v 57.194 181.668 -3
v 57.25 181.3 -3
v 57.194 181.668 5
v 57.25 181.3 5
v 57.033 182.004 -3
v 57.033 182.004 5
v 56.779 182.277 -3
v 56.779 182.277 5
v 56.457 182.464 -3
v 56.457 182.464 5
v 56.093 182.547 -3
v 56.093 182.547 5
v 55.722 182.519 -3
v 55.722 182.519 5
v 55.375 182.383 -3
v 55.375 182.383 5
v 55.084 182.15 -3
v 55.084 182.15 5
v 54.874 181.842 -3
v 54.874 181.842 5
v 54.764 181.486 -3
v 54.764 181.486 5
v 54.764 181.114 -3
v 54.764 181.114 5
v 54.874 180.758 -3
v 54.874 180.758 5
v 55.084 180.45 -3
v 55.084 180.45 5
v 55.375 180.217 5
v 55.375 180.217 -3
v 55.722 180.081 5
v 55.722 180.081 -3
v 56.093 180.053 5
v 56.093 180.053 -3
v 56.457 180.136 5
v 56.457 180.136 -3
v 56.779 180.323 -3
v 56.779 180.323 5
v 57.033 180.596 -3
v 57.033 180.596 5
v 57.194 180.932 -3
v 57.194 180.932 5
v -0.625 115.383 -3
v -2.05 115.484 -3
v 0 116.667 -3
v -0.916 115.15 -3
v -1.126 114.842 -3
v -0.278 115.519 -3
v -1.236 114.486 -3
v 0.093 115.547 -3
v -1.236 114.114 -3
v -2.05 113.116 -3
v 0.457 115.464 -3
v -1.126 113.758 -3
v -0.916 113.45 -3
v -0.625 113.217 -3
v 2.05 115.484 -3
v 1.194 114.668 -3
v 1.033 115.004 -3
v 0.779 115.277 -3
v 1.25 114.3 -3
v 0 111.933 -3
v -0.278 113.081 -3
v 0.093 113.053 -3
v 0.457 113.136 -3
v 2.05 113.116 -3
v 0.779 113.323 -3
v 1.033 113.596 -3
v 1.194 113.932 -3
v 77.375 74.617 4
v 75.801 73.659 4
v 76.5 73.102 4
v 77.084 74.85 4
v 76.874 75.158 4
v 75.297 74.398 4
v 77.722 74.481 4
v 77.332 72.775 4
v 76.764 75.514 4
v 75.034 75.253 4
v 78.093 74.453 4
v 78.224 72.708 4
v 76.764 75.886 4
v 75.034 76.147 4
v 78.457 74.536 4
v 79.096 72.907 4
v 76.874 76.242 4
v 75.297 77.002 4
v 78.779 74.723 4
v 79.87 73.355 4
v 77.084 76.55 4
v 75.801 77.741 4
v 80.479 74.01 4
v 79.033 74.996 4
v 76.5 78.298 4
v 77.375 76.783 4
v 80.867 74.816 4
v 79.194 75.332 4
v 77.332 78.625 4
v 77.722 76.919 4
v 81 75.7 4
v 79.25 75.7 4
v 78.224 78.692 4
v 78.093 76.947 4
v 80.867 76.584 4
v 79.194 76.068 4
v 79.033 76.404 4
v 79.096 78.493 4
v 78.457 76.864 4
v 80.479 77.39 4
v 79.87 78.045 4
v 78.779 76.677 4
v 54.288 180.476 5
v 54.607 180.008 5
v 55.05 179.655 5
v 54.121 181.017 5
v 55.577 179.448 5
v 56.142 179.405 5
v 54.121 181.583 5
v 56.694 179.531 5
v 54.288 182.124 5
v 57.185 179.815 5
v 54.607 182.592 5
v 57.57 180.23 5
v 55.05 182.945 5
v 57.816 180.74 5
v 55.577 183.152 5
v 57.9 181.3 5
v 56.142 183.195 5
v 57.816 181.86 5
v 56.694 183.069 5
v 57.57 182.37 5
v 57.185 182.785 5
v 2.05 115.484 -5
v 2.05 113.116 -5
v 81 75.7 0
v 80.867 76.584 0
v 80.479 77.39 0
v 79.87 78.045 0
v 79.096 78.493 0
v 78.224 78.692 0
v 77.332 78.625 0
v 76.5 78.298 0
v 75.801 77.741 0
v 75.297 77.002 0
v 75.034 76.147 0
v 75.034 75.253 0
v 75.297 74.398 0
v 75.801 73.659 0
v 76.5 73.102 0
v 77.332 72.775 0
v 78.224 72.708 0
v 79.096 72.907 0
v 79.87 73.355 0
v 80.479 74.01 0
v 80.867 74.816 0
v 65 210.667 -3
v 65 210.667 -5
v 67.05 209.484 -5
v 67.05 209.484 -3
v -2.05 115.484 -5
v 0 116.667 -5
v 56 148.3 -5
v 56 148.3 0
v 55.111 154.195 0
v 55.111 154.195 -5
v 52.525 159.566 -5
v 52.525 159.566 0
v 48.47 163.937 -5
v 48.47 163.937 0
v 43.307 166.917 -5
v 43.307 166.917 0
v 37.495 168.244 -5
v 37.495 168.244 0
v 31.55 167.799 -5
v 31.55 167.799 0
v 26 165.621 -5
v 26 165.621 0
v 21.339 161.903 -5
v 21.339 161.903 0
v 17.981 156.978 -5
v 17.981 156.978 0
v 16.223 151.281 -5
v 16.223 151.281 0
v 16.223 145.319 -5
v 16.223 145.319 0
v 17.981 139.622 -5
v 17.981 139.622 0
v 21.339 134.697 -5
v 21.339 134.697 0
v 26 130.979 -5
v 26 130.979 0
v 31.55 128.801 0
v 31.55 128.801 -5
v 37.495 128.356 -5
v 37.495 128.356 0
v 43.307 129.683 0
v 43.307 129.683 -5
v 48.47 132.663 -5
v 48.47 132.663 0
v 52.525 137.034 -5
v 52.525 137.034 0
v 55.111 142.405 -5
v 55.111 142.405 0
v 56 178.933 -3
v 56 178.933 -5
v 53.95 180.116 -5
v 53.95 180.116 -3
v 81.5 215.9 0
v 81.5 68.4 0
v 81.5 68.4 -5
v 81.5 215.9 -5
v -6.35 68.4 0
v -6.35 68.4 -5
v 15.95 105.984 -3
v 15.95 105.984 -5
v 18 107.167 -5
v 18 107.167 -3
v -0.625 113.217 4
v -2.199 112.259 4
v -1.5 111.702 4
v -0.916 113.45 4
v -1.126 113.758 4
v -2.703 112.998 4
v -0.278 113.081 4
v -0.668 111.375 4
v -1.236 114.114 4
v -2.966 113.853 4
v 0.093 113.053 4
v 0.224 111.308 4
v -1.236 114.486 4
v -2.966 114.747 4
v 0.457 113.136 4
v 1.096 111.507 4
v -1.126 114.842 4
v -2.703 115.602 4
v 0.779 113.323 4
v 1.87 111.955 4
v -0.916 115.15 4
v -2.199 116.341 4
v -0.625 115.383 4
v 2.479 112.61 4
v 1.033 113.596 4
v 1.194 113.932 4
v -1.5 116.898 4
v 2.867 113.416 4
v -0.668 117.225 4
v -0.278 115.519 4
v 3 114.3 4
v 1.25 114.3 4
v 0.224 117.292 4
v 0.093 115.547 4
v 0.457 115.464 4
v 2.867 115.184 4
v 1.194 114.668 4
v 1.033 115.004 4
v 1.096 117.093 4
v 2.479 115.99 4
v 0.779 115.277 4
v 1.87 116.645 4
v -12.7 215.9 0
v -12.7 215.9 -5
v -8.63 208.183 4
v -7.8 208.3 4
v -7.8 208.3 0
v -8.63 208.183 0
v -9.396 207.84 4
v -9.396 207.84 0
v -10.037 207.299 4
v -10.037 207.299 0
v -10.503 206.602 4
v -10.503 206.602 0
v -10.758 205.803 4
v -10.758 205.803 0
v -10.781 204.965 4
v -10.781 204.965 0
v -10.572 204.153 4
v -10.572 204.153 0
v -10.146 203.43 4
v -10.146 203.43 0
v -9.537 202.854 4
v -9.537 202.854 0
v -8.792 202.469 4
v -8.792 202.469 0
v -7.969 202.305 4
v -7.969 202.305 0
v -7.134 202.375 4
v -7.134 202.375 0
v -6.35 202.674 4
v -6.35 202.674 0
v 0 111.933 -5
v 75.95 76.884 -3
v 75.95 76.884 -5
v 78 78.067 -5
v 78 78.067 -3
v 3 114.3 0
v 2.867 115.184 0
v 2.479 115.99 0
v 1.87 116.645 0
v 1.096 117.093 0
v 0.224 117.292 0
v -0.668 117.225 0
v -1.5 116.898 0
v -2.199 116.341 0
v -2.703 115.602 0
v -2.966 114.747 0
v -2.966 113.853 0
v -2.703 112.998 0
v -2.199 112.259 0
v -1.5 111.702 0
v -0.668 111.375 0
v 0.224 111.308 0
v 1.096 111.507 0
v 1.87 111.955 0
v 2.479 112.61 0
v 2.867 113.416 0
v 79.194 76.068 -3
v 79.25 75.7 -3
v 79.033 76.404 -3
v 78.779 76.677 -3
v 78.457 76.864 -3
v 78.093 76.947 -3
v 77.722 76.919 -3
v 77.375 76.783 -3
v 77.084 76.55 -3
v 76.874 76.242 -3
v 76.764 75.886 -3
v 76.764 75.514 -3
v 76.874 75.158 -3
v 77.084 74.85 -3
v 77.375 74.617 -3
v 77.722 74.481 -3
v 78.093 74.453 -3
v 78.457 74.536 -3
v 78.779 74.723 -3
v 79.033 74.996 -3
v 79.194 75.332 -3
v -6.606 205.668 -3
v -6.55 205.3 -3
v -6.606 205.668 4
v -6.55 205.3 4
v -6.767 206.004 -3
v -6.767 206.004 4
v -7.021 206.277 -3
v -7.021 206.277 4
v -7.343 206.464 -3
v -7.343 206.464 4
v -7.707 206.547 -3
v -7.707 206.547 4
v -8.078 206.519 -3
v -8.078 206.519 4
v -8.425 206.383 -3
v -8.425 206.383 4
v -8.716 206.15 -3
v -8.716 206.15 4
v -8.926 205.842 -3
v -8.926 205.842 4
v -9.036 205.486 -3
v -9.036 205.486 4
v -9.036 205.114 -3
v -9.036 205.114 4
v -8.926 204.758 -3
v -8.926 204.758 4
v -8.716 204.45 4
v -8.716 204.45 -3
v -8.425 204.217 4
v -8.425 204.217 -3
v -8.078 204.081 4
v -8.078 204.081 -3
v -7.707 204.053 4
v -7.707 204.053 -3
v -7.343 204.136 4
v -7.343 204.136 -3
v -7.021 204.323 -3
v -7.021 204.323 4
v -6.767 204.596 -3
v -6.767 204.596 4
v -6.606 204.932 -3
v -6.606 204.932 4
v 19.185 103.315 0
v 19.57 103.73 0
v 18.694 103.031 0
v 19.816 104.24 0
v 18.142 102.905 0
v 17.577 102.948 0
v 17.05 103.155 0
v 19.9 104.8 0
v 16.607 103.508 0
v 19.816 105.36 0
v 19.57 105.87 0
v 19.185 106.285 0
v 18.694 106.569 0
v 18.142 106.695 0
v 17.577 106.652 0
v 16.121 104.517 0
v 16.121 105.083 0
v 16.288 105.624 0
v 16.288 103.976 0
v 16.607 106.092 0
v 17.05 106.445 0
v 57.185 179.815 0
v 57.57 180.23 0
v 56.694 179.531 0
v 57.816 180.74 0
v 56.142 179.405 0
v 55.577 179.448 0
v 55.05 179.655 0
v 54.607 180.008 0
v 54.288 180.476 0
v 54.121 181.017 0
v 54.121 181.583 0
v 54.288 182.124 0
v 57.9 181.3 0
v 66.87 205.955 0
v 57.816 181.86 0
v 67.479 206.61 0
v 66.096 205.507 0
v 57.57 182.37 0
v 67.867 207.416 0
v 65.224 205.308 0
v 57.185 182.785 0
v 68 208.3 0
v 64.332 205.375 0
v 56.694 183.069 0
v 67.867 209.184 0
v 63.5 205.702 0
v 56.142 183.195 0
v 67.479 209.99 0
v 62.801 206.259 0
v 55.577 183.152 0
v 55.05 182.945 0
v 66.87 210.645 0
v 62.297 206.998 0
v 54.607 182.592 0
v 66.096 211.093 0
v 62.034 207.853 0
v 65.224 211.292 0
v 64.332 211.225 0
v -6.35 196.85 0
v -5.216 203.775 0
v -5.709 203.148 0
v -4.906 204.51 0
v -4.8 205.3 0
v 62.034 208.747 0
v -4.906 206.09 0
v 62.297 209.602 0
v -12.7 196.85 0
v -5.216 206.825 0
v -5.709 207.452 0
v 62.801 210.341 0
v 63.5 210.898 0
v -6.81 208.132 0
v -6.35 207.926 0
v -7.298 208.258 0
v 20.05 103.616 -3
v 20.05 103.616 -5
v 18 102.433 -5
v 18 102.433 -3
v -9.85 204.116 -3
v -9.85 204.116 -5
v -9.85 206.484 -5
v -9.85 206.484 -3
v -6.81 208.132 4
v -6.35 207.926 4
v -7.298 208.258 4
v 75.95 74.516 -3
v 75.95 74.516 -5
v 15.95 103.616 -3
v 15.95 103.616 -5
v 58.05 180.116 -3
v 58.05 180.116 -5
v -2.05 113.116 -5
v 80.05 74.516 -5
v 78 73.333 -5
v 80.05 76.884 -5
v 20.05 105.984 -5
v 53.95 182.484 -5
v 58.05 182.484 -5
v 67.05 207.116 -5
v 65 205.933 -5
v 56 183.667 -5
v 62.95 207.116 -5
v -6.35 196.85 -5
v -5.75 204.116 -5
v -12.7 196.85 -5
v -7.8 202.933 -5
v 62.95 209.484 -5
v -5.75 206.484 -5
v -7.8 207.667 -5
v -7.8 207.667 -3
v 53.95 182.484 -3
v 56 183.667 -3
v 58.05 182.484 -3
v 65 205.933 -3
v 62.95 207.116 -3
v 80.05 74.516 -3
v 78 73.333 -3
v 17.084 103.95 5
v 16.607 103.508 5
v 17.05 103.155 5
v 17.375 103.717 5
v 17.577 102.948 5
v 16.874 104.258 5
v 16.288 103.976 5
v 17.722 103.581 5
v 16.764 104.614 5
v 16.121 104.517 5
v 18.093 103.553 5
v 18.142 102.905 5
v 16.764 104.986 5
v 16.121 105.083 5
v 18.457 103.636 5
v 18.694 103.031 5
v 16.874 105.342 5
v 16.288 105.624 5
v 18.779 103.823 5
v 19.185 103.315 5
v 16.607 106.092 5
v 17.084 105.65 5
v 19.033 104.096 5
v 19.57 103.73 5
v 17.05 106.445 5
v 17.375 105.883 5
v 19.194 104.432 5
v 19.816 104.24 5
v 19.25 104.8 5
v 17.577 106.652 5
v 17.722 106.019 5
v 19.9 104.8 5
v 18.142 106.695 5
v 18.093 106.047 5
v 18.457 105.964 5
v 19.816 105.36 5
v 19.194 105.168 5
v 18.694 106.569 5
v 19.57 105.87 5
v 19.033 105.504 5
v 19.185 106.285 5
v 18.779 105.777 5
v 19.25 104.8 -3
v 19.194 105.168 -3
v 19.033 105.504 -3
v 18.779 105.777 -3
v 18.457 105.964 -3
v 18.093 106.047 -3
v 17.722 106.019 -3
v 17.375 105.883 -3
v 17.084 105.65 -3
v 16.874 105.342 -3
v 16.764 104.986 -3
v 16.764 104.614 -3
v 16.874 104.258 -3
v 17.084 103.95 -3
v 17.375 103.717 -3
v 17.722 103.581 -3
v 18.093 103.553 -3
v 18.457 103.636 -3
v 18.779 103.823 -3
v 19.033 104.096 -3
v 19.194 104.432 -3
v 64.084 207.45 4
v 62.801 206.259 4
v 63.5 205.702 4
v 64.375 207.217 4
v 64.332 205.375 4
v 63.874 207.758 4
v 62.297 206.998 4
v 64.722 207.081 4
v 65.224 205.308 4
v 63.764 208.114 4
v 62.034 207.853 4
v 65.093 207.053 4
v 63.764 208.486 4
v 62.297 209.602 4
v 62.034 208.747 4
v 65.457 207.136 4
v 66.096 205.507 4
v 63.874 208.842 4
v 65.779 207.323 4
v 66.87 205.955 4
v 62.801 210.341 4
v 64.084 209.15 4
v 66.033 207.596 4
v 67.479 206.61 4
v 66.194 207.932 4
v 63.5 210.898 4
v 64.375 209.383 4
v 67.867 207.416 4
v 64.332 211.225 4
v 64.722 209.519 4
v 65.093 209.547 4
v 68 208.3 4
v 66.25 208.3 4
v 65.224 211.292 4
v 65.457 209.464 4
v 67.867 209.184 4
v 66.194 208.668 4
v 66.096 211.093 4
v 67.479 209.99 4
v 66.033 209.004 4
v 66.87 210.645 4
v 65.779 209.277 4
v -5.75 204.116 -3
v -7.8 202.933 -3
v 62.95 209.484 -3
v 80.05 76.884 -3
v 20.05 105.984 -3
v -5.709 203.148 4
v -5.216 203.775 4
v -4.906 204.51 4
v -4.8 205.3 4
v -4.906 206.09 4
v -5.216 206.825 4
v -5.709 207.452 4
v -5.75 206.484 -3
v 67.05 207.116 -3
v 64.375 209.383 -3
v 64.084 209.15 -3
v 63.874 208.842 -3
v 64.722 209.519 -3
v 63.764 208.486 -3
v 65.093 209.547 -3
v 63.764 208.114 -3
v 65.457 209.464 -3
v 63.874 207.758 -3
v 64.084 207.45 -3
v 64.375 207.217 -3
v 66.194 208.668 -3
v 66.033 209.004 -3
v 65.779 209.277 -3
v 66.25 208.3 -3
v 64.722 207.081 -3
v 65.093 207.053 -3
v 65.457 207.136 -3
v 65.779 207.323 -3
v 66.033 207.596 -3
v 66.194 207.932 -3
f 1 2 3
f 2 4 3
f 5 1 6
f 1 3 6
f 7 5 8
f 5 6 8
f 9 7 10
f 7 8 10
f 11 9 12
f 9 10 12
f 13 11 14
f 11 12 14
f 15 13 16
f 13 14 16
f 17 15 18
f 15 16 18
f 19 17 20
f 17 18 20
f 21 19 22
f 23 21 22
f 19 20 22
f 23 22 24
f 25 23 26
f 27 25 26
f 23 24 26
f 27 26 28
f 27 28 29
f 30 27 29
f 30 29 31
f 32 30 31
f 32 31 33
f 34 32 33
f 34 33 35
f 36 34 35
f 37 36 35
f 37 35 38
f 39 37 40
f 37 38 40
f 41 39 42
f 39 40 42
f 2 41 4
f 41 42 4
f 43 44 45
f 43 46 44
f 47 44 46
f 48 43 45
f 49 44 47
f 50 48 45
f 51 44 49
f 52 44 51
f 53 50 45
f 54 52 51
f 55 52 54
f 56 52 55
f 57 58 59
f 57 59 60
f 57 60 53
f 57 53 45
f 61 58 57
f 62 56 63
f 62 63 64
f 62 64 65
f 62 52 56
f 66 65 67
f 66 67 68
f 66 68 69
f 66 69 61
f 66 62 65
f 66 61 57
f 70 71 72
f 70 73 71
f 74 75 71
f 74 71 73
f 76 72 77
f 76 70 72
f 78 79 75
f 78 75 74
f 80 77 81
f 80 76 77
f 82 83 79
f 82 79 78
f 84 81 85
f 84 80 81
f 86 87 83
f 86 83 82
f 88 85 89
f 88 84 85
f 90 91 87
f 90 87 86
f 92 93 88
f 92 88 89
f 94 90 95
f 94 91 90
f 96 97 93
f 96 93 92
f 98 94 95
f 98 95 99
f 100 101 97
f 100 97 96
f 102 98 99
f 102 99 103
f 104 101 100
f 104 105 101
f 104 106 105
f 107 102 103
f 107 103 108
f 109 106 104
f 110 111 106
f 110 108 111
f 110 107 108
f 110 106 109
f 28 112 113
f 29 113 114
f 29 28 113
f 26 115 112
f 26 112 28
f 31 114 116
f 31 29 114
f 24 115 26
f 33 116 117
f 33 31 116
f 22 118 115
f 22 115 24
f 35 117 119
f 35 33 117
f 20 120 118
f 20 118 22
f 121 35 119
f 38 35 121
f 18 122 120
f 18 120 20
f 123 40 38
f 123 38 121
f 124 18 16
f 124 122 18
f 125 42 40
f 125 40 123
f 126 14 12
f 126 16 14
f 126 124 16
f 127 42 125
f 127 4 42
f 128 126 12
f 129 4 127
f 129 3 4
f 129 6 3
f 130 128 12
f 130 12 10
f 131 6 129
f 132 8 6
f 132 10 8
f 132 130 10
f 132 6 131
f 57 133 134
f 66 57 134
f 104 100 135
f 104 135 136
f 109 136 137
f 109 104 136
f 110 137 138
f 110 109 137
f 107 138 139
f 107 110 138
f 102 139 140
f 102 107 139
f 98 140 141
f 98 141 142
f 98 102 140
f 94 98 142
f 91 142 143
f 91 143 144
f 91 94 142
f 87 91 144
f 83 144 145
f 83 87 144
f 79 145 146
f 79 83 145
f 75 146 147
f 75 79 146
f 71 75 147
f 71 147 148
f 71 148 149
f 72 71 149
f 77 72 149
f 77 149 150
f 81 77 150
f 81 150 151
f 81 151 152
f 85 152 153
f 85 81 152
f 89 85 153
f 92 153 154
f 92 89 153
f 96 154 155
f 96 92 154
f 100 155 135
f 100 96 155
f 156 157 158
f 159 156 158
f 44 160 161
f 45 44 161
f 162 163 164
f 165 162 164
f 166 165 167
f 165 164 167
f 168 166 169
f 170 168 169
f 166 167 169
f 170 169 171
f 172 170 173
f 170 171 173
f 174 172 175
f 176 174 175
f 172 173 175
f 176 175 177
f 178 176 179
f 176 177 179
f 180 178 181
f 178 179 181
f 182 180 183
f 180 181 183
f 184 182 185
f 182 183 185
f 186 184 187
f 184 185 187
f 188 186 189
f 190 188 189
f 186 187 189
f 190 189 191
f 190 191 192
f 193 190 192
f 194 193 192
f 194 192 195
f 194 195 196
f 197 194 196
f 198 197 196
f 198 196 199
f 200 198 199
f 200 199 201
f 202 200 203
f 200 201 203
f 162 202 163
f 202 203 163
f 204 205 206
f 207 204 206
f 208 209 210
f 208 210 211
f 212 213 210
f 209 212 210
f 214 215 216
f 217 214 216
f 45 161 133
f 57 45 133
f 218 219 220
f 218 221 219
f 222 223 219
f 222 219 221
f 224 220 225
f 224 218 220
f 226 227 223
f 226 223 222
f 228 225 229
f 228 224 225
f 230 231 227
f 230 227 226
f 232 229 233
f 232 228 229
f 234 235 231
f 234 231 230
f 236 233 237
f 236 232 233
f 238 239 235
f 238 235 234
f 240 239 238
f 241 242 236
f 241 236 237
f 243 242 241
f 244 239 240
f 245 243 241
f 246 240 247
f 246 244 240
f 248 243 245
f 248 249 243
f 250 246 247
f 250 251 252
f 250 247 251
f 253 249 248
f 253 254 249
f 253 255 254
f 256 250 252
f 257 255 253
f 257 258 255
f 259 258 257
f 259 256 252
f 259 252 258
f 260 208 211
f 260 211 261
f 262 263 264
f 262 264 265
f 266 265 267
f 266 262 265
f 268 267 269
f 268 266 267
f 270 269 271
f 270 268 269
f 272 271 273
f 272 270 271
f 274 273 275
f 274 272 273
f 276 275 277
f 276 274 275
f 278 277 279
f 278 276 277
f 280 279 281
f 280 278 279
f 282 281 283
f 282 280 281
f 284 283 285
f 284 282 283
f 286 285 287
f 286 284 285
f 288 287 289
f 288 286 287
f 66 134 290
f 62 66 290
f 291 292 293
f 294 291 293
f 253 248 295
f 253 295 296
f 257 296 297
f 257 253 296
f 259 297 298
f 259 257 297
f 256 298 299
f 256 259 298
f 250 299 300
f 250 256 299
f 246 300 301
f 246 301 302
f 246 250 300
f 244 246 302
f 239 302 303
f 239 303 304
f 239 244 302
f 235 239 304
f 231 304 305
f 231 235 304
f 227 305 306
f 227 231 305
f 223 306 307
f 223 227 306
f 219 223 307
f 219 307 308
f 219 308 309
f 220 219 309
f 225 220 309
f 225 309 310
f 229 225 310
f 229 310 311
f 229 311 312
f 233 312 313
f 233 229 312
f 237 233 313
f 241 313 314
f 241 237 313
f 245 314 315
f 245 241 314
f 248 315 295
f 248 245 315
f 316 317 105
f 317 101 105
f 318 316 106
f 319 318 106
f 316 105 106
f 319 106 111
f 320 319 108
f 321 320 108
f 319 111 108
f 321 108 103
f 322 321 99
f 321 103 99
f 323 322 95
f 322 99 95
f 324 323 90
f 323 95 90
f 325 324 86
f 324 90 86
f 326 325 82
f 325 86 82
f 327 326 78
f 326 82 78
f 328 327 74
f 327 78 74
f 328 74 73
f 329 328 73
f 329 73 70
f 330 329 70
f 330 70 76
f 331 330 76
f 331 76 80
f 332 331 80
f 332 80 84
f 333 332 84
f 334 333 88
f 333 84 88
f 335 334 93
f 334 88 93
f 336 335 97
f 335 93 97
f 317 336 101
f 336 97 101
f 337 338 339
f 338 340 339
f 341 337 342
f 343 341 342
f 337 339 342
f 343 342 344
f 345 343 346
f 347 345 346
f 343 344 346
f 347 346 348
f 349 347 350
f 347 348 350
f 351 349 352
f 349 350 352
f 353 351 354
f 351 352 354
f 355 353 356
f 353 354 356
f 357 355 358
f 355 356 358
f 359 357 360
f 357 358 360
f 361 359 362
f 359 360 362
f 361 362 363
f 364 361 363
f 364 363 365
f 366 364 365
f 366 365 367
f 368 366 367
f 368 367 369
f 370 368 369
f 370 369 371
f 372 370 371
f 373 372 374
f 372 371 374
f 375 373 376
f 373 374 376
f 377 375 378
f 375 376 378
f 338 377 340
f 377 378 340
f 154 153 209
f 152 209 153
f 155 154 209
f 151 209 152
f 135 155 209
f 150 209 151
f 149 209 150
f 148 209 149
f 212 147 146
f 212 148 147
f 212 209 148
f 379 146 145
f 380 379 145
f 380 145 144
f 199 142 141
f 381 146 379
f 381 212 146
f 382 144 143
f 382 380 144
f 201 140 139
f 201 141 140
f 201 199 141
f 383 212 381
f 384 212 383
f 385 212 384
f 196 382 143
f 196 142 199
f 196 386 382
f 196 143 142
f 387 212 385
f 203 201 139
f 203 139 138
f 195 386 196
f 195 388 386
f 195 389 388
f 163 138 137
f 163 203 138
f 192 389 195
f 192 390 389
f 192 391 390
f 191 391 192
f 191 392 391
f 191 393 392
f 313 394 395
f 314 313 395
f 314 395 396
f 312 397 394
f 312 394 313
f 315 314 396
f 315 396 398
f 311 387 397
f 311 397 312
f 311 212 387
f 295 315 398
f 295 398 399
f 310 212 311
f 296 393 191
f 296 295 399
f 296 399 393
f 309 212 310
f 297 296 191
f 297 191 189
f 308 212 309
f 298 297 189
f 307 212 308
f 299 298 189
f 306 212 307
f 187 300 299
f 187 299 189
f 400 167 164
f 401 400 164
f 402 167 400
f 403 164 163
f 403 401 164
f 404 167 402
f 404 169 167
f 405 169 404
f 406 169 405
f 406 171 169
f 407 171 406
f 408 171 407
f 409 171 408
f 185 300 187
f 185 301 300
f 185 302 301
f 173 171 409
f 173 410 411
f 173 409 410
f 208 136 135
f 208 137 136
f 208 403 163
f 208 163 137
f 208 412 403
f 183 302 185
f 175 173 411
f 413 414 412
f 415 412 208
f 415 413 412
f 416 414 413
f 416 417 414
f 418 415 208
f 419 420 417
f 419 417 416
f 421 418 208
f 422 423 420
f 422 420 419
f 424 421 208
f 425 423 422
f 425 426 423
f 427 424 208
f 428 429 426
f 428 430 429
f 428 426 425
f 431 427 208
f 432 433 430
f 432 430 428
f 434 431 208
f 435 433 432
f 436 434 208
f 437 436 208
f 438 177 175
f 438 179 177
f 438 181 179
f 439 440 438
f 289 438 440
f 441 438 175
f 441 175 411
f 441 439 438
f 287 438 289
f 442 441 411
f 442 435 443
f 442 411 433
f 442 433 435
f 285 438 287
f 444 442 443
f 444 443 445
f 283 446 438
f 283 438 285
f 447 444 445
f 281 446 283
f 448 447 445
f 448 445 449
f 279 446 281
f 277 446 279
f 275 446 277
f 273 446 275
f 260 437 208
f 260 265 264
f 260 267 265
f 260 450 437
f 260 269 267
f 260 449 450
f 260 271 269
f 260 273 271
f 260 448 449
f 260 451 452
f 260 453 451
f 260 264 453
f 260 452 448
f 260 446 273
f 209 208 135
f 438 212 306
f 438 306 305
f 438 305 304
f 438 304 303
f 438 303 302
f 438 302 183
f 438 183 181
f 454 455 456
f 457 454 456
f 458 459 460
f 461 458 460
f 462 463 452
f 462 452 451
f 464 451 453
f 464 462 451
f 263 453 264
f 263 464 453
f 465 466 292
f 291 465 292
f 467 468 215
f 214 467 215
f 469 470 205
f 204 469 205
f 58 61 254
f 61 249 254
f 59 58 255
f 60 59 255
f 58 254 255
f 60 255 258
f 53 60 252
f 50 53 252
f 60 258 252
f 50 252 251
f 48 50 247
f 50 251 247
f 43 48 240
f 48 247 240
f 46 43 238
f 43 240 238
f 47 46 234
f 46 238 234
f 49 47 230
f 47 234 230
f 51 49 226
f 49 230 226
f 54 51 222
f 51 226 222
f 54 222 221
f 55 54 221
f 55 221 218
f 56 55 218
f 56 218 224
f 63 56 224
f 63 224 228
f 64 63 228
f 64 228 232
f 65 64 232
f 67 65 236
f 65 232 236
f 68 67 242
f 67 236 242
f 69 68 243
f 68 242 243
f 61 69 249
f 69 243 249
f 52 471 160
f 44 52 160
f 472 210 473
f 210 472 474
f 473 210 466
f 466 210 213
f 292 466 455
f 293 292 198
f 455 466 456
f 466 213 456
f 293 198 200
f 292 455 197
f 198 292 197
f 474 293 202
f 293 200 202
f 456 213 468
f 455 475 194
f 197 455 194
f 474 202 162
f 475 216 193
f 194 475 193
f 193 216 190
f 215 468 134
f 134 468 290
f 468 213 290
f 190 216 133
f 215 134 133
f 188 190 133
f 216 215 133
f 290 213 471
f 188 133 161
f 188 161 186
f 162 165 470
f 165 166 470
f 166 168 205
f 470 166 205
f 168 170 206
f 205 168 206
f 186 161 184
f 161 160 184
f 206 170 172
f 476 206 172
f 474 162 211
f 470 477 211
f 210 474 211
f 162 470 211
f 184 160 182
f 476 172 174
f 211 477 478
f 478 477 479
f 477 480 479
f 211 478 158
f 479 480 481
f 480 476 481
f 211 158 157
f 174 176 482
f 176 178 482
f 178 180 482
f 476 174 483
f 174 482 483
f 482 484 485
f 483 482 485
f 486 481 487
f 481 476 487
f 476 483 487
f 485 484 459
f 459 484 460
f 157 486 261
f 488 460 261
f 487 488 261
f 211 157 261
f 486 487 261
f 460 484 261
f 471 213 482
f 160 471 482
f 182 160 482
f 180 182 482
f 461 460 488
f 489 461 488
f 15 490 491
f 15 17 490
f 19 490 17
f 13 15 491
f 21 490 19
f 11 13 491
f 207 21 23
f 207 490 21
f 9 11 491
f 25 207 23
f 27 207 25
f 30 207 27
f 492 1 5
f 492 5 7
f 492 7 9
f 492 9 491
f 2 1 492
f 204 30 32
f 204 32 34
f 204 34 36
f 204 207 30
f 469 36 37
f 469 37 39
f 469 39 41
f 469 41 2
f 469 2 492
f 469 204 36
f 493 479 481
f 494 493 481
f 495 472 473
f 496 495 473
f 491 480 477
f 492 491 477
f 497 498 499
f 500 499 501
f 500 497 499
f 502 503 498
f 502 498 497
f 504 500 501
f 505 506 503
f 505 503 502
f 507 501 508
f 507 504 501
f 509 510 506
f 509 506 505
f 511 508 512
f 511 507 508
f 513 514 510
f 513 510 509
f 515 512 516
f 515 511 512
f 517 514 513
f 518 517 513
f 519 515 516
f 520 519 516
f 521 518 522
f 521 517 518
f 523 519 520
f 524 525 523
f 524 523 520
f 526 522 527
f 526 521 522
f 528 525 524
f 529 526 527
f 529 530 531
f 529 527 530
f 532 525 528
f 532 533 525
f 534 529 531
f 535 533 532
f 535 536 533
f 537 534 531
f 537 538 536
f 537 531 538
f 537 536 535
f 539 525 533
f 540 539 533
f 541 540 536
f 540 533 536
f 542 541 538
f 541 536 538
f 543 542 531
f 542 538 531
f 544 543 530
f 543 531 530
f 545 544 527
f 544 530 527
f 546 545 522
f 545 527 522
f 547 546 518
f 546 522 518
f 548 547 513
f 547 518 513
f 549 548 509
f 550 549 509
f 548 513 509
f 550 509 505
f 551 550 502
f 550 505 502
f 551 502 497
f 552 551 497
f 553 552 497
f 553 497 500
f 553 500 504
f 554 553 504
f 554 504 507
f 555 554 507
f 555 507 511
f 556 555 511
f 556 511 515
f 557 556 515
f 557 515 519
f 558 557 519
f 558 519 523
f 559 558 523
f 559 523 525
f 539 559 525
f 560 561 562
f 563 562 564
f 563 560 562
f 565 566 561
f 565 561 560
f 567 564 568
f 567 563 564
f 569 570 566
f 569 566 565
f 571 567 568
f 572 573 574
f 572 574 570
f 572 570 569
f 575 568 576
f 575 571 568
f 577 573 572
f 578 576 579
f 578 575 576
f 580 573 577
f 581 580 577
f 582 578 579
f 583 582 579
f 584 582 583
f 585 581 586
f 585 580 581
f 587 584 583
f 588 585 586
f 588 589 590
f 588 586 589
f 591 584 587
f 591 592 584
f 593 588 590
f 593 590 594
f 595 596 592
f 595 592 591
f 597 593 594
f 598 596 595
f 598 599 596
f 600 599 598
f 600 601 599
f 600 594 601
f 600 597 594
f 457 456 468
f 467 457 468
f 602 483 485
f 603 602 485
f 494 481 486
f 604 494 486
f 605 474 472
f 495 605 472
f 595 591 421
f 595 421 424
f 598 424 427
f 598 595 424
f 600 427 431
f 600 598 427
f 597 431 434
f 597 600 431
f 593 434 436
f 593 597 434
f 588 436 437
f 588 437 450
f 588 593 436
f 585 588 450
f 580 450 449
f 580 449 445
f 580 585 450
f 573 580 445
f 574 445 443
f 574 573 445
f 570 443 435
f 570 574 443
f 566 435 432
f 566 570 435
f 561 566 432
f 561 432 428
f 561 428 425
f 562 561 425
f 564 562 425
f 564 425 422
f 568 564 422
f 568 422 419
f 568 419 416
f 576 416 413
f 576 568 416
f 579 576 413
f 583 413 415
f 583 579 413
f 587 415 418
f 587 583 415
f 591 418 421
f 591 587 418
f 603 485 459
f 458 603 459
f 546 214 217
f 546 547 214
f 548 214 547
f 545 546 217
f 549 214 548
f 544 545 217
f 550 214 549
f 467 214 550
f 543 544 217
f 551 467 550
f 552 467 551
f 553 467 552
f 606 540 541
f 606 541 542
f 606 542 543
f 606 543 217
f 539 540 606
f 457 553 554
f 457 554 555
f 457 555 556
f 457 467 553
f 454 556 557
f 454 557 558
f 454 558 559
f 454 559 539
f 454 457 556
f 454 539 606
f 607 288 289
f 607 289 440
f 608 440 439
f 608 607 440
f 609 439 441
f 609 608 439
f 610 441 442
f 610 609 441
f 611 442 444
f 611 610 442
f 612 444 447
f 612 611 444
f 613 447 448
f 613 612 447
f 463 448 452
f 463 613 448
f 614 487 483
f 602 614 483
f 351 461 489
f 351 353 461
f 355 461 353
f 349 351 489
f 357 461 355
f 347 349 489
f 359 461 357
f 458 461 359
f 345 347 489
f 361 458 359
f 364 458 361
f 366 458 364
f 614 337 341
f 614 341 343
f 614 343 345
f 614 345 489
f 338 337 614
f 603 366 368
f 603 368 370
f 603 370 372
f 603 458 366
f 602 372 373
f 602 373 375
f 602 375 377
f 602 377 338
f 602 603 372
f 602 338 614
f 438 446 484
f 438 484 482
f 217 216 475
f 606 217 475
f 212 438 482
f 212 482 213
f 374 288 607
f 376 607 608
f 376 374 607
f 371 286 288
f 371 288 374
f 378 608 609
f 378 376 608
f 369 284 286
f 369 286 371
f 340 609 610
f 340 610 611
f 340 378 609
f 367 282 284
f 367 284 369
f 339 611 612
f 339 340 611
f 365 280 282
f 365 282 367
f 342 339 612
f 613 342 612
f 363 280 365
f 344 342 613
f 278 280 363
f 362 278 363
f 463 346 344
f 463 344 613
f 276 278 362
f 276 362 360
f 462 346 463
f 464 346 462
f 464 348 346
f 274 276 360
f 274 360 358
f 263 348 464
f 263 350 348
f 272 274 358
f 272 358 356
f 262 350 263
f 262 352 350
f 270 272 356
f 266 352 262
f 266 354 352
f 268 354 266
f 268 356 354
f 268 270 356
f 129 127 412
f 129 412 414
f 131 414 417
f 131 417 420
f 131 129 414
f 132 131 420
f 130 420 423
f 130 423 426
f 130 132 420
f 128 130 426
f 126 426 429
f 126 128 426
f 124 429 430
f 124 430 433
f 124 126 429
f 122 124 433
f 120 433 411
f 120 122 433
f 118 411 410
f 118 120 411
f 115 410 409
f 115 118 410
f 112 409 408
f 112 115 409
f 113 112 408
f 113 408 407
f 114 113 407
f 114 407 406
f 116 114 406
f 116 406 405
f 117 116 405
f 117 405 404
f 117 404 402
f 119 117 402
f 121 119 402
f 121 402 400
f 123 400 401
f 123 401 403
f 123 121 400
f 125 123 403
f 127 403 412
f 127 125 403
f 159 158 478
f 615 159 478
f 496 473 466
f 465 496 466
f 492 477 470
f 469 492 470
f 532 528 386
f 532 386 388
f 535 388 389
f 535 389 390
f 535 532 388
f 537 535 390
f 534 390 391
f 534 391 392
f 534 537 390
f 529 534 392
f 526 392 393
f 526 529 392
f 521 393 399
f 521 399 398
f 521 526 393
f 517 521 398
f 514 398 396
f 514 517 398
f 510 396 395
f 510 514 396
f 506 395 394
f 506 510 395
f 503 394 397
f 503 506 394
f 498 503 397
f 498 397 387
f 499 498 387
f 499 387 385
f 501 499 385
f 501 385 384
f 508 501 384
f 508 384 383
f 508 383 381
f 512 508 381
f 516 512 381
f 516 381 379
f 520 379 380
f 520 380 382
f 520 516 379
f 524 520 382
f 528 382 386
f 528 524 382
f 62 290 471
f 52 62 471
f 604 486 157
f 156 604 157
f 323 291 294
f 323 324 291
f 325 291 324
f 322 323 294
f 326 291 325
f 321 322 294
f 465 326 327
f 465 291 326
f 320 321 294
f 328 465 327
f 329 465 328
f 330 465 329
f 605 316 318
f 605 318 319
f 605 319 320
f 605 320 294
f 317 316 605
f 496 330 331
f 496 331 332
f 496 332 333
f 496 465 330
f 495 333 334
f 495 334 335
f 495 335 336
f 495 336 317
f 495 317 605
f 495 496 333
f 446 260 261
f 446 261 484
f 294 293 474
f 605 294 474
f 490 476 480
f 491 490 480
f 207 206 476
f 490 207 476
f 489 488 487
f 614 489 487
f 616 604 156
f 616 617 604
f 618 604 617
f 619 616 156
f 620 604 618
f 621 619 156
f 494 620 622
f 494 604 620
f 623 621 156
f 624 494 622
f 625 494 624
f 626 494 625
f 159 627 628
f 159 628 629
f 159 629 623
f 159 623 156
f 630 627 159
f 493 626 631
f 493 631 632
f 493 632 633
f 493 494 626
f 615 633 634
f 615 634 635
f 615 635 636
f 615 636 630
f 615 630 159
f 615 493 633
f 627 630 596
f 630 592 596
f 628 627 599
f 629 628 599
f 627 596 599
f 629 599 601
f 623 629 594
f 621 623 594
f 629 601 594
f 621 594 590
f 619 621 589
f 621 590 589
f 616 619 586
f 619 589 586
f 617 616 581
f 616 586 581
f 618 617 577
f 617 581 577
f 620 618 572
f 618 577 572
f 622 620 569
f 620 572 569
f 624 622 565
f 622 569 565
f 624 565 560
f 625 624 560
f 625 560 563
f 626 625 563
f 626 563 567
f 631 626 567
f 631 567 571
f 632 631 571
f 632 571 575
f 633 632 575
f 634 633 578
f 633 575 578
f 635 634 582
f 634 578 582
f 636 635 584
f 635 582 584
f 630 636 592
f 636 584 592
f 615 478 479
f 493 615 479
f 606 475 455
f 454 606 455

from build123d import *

# Parameters (mm, degrees)
SKETCH1_R           = 20
SKETCH1_R_2         = 1.25
BOSS_EXTRUDE1_DEPTH = 5
BOSS_EXTRUDE2_START = 4
SKETCH1_3_R         = 1.25
SKETCH1_3_R_2       = 3
BOSS_EXTRUDE2_DEPTH = 4
BOSS_EXTRUDE3_START = 5
SKETCH1_5_R         = 1.9
SKETCH1_5_R_2       = 1.25
BOSS_EXTRUDE3_DEPTH = 5
CUT_EXTRUDE1_DEPTH  = 2
INTERSECT1_START    = -101.6
INTERSECT1_DEPTH    = 170


# Read off the part's stored shape, not the designer's step: Intersect1
with BuildPart() as part:
    # Sketch1 → Boss-Extrude1 (new body)
    with BuildSketch(Plane(origin=(0, 0, 0), x_dir=(0, 1, 0), z_dir=(0, 0, 1))):
        Polygon((-101.6, 25.4), (-101.6, -81.5), (215.9, -81.5), (215.9, 12.7), (196.85, 12.7), (196.85, 6.35), (-57.15, 6.35), (-57.15, 25.4), align=None)
        with Locations(Location((148.3, -36, 0), (0, 0, 270))):
            Circle(SKETCH1_R, mode=Mode.SUBTRACT)
        with Locations(Location((-92.5, 8, 0), (0, 0, 270))):
            Circle(SKETCH1_R_2, mode=Mode.SUBTRACT)
        with Locations(Location((205.3, 7.8, 0), (0, 0, 270))):
            Circle(SKETCH1_R_2, mode=Mode.SUBTRACT)
        with Locations(Location((-86.5, -73, 0), (0, 0, 270))):
            Circle(SKETCH1_R_2, mode=Mode.SUBTRACT)
        with Locations(Location((0, 0, 0), (0, 0, 270))):
            Circle(SKETCH1_R_2, mode=Mode.SUBTRACT)
        with Locations(Location((114.3, 0, 0), (0, 0, 270))):
            Circle(SKETCH1_R_2, mode=Mode.SUBTRACT)
        with Locations(Location((104.8, -18, 0), (0, 0, 270))):
            Circle(SKETCH1_R_2, mode=Mode.SUBTRACT)
        with Locations(Location((75.7, -78, 0), (0, 0, 270))):
            Circle(SKETCH1_R_2, mode=Mode.SUBTRACT)
        with Locations(Location((181.3, -56, 0), (0, 0, 270))):
            Circle(SKETCH1_R_2, mode=Mode.SUBTRACT)
        with Locations(Location((208.3, -65, 0), (0, 0, 270))):
            Circle(SKETCH1_R_2, mode=Mode.SUBTRACT)
    extrude(amount=-BOSS_EXTRUDE1_DEPTH)

    # Sketch1<3> → Boss-Extrude2 (add)
    # profile 1 of 9: a face of its own
    with BuildSketch(Plane(origin=(0, 0, 0), x_dir=(0, 1, 0), z_dir=(0, 0, 1)).offset(BOSS_EXTRUDE2_START)):
        with BuildLine():
            Line((-95.005493963, 6.35), (-89.994506037, 6.35))
            ThreePointArc((-89.994506037, 6.35), (-89.62628447, 7.13874565), (-89.5, 8))
            ThreePointArc((-89.5, 8), (-93.36125435, 10.87371553), (-95.005493963, 6.35))
        make_face()
        with Locations(Location((-92.5, 8, 0), (0, 0, 270))):
            Circle(SKETCH1_3_R, mode=Mode.SUBTRACT)
    # profile 2 of 9: a face of its own
    with BuildSketch(Plane(origin=(0, 0, 0), x_dir=(0, 1, 0), z_dir=(0, 0, 1)).offset(BOSS_EXTRUDE2_START)):
        with BuildLine():
            ThreePointArc((-95.005493963, 6.35), (-92.5, 5), (-89.994506037, 6.35))
            Line((-89.994506037, 6.35), (-95.005493963, 6.35))
        make_face()
    # profile 3 of 9: a face of its own
    with BuildSketch(Plane(origin=(0, 0, 0), x_dir=(0, 1, 0), z_dir=(0, 0, 1)).offset(BOSS_EXTRUDE2_START)):
        with Locations(Location((-86.5, -73, 0), (0, 0, 270))):
            Circle(SKETCH1_3_R_2)
        with Locations(Location((-86.5, -73, 0), (0, 0, 270))):
            Circle(SKETCH1_3_R, mode=Mode.SUBTRACT)
    # profile 4 of 9: a face of its own
    with BuildSketch(Plane(origin=(0, 0, 0), x_dir=(0, 1, 0), z_dir=(0, 0, 1)).offset(BOSS_EXTRUDE2_START)):
        with Locations(Location((0, 0, 0), (0, 0, 270))):
            Circle(SKETCH1_3_R_2)
        with Locations(Location((0, 0, 0), (0, 0, 270))):
            Circle(SKETCH1_3_R, mode=Mode.SUBTRACT)
    # profile 5 of 9: a face of its own
    with BuildSketch(Plane(origin=(0, 0, 0), x_dir=(0, 1, 0), z_dir=(0, 0, 1)).offset(BOSS_EXTRUDE2_START)):
        with Locations(Location((75.7, -78, 0), (0, 0, 270))):
            Circle(SKETCH1_3_R_2)
        with Locations(Location((75.7, -78, 0), (0, 0, 270))):
            Circle(SKETCH1_3_R, mode=Mode.SUBTRACT)
    # profile 6 of 9: a face of its own
    with BuildSketch(Plane(origin=(0, 0, 0), x_dir=(0, 1, 0), z_dir=(0, 0, 1)).offset(BOSS_EXTRUDE2_START)):
        with Locations(Location((114.3, 0, 0), (0, 0, 270))):
            Circle(SKETCH1_3_R_2)
        with Locations(Location((114.3, 0, 0), (0, 0, 270))):
            Circle(SKETCH1_3_R, mode=Mode.SUBTRACT)
    # profile 7 of 9: a face of its own
    with BuildSketch(Plane(origin=(0, 0, 0), x_dir=(0, 1, 0), z_dir=(0, 0, 1)).offset(BOSS_EXTRUDE2_START)):
        with Locations(Location((208.3, -65, 0), (0, 0, 270))):
            Circle(SKETCH1_3_R_2)
        with Locations(Location((208.3, -65, 0), (0, 0, 270))):
            Circle(SKETCH1_3_R, mode=Mode.SUBTRACT)
    # profile 8 of 9: a face of its own
    with BuildSketch(Plane(origin=(0, 0, 0), x_dir=(0, 1, 0), z_dir=(0, 0, 1)).offset(BOSS_EXTRUDE2_START)):
        with BuildLine():
            ThreePointArc((208.3, 7.8), (204.551310342, 10.705075523), (202.673690803, 6.35))
            Line((202.673690803, 6.35), (207.926309197, 6.35))
            ThreePointArc((207.926309197, 6.35), (208.205075523, 7.051310342), (208.3, 7.8))
        make_face()
        with Locations(Location((205.3, 7.8, 0), (0, 0, 270))):
            Circle(SKETCH1_3_R, mode=Mode.SUBTRACT)
    # profile 9 of 9: a face of its own
    with BuildSketch(Plane(origin=(0, 0, 0), x_dir=(0, 1, 0), z_dir=(0, 0, 1)).offset(BOSS_EXTRUDE2_START)):
        with BuildLine():
            Line((207.926309197, 6.35), (202.673690803, 6.35))
            ThreePointArc((202.673690803, 6.35), (205.3, 4.8), (207.926309197, 6.35))
        make_face()
    extrude(amount=-BOSS_EXTRUDE2_DEPTH)

    # Sketch1<5> → Boss-Extrude3 (add)
    # profile 1 of 2: a face of its own
    with BuildSketch(Plane(origin=(0, 0, 0), x_dir=(0, 1, 0), z_dir=(0, 0, 1)).offset(BOSS_EXTRUDE3_START)):
        with Locations(Location((104.8, -18, 0), (0, 0, 270))):
            Circle(SKETCH1_5_R)
        with Locations(Location((104.8, -18, 0), (0, 0, 270))):
            Circle(SKETCH1_5_R_2, mode=Mode.SUBTRACT)
    # profile 2 of 2: a face of its own
    with BuildSketch(Plane(origin=(0, 0, 0), x_dir=(0, 1, 0), z_dir=(0, 0, 1)).offset(BOSS_EXTRUDE3_START)):
        with Locations(Location((181.3, -56, 0), (0, 0, 270))):
            Circle(SKETCH1_5_R)
        with Locations(Location((181.3, -56, 0), (0, 0, 270))):
            Circle(SKETCH1_5_R_2, mode=Mode.SUBTRACT)
    extrude(amount=-BOSS_EXTRUDE3_DEPTH)

    # Sketch3 → Cut-Extrude1 (cut)
    with BuildSketch(Plane(origin=(0, 0, -5), x_dir=(1, 0, 0), z_dir=(0, 0, -1))):
        Polygon((78, -78.067136104), (80.05, -76.883568052), (80.05, -74.516431948), (78, -73.332863896), (75.95, -74.516431948), (75.95, -76.883568052), align=None)
        Polygon((65, -210.667136104), (67.05, -209.483568052), (67.05, -207.116431948), (65, -205.932863896), (62.95, -207.116431948), (62.95, -209.483568052), align=None)
        Polygon((56, -183.667136104), (58.05, -182.483568052), (58.05, -180.116431948), (56, -178.932863896), (53.95, -180.116431948), (53.95, -182.483568052), align=None)
        Polygon((-7.8, -207.667136104), (-5.75, -206.483568052), (-5.75, -204.116431948), (-7.8, -202.932863896), (-9.85, -204.116431948), (-9.85, -206.483568052), align=None)
        Polygon((0, -116.667136104), (2.05, -115.483568052), (2.05, -113.116431948), (0, -111.932863896), (-2.05, -113.116431948), (-2.05, -115.483568052), align=None)
        Polygon((18, -107.167136104), (20.05, -105.983568052), (20.05, -103.616431948), (18, -102.432863896), (15.95, -103.616431948), (15.95, -105.983568052), align=None)
        Polygon((0, -2.367136104), (2.05, -1.183568052), (2.05, 1.183568052), (0, 2.367136104), (-2.05, 1.183568052), (-2.05, -1.183568052), align=None)
        Polygon((-8, 90.132863896), (-5.95, 91.316431948), (-5.95, 93.683568052), (-8, 94.867136104), (-10.05, 93.683568052), (-10.05, 91.316431948), align=None)
        Polygon((73, 84.132863896), (75.05, 85.316431948), (75.05, 87.683568052), (73, 88.867136104), (70.95, 87.683568052), (70.95, 85.316431948), align=None)
    extrude(amount=-CUT_EXTRUDE1_DEPTH, mode=Mode.SUBTRACT)

    # Intersect1 outline → Intersect1 (cut)
    with BuildSketch(Plane(origin=(0, 0, 0), x_dir=(1, 0, 0), z_dir=(0, 1, 0)).offset(INTERSECT1_START)):
        Polygon((83, -4), (83, 6), (75.05, 6), (75.05, 5), (-10.05, 5), (-10.05, 6), (-27, 6), (-27, -4), align=None)
    extrude(amount=INTERSECT1_DEPTH, mode=Mode.SUBTRACT)


solid = part.part
